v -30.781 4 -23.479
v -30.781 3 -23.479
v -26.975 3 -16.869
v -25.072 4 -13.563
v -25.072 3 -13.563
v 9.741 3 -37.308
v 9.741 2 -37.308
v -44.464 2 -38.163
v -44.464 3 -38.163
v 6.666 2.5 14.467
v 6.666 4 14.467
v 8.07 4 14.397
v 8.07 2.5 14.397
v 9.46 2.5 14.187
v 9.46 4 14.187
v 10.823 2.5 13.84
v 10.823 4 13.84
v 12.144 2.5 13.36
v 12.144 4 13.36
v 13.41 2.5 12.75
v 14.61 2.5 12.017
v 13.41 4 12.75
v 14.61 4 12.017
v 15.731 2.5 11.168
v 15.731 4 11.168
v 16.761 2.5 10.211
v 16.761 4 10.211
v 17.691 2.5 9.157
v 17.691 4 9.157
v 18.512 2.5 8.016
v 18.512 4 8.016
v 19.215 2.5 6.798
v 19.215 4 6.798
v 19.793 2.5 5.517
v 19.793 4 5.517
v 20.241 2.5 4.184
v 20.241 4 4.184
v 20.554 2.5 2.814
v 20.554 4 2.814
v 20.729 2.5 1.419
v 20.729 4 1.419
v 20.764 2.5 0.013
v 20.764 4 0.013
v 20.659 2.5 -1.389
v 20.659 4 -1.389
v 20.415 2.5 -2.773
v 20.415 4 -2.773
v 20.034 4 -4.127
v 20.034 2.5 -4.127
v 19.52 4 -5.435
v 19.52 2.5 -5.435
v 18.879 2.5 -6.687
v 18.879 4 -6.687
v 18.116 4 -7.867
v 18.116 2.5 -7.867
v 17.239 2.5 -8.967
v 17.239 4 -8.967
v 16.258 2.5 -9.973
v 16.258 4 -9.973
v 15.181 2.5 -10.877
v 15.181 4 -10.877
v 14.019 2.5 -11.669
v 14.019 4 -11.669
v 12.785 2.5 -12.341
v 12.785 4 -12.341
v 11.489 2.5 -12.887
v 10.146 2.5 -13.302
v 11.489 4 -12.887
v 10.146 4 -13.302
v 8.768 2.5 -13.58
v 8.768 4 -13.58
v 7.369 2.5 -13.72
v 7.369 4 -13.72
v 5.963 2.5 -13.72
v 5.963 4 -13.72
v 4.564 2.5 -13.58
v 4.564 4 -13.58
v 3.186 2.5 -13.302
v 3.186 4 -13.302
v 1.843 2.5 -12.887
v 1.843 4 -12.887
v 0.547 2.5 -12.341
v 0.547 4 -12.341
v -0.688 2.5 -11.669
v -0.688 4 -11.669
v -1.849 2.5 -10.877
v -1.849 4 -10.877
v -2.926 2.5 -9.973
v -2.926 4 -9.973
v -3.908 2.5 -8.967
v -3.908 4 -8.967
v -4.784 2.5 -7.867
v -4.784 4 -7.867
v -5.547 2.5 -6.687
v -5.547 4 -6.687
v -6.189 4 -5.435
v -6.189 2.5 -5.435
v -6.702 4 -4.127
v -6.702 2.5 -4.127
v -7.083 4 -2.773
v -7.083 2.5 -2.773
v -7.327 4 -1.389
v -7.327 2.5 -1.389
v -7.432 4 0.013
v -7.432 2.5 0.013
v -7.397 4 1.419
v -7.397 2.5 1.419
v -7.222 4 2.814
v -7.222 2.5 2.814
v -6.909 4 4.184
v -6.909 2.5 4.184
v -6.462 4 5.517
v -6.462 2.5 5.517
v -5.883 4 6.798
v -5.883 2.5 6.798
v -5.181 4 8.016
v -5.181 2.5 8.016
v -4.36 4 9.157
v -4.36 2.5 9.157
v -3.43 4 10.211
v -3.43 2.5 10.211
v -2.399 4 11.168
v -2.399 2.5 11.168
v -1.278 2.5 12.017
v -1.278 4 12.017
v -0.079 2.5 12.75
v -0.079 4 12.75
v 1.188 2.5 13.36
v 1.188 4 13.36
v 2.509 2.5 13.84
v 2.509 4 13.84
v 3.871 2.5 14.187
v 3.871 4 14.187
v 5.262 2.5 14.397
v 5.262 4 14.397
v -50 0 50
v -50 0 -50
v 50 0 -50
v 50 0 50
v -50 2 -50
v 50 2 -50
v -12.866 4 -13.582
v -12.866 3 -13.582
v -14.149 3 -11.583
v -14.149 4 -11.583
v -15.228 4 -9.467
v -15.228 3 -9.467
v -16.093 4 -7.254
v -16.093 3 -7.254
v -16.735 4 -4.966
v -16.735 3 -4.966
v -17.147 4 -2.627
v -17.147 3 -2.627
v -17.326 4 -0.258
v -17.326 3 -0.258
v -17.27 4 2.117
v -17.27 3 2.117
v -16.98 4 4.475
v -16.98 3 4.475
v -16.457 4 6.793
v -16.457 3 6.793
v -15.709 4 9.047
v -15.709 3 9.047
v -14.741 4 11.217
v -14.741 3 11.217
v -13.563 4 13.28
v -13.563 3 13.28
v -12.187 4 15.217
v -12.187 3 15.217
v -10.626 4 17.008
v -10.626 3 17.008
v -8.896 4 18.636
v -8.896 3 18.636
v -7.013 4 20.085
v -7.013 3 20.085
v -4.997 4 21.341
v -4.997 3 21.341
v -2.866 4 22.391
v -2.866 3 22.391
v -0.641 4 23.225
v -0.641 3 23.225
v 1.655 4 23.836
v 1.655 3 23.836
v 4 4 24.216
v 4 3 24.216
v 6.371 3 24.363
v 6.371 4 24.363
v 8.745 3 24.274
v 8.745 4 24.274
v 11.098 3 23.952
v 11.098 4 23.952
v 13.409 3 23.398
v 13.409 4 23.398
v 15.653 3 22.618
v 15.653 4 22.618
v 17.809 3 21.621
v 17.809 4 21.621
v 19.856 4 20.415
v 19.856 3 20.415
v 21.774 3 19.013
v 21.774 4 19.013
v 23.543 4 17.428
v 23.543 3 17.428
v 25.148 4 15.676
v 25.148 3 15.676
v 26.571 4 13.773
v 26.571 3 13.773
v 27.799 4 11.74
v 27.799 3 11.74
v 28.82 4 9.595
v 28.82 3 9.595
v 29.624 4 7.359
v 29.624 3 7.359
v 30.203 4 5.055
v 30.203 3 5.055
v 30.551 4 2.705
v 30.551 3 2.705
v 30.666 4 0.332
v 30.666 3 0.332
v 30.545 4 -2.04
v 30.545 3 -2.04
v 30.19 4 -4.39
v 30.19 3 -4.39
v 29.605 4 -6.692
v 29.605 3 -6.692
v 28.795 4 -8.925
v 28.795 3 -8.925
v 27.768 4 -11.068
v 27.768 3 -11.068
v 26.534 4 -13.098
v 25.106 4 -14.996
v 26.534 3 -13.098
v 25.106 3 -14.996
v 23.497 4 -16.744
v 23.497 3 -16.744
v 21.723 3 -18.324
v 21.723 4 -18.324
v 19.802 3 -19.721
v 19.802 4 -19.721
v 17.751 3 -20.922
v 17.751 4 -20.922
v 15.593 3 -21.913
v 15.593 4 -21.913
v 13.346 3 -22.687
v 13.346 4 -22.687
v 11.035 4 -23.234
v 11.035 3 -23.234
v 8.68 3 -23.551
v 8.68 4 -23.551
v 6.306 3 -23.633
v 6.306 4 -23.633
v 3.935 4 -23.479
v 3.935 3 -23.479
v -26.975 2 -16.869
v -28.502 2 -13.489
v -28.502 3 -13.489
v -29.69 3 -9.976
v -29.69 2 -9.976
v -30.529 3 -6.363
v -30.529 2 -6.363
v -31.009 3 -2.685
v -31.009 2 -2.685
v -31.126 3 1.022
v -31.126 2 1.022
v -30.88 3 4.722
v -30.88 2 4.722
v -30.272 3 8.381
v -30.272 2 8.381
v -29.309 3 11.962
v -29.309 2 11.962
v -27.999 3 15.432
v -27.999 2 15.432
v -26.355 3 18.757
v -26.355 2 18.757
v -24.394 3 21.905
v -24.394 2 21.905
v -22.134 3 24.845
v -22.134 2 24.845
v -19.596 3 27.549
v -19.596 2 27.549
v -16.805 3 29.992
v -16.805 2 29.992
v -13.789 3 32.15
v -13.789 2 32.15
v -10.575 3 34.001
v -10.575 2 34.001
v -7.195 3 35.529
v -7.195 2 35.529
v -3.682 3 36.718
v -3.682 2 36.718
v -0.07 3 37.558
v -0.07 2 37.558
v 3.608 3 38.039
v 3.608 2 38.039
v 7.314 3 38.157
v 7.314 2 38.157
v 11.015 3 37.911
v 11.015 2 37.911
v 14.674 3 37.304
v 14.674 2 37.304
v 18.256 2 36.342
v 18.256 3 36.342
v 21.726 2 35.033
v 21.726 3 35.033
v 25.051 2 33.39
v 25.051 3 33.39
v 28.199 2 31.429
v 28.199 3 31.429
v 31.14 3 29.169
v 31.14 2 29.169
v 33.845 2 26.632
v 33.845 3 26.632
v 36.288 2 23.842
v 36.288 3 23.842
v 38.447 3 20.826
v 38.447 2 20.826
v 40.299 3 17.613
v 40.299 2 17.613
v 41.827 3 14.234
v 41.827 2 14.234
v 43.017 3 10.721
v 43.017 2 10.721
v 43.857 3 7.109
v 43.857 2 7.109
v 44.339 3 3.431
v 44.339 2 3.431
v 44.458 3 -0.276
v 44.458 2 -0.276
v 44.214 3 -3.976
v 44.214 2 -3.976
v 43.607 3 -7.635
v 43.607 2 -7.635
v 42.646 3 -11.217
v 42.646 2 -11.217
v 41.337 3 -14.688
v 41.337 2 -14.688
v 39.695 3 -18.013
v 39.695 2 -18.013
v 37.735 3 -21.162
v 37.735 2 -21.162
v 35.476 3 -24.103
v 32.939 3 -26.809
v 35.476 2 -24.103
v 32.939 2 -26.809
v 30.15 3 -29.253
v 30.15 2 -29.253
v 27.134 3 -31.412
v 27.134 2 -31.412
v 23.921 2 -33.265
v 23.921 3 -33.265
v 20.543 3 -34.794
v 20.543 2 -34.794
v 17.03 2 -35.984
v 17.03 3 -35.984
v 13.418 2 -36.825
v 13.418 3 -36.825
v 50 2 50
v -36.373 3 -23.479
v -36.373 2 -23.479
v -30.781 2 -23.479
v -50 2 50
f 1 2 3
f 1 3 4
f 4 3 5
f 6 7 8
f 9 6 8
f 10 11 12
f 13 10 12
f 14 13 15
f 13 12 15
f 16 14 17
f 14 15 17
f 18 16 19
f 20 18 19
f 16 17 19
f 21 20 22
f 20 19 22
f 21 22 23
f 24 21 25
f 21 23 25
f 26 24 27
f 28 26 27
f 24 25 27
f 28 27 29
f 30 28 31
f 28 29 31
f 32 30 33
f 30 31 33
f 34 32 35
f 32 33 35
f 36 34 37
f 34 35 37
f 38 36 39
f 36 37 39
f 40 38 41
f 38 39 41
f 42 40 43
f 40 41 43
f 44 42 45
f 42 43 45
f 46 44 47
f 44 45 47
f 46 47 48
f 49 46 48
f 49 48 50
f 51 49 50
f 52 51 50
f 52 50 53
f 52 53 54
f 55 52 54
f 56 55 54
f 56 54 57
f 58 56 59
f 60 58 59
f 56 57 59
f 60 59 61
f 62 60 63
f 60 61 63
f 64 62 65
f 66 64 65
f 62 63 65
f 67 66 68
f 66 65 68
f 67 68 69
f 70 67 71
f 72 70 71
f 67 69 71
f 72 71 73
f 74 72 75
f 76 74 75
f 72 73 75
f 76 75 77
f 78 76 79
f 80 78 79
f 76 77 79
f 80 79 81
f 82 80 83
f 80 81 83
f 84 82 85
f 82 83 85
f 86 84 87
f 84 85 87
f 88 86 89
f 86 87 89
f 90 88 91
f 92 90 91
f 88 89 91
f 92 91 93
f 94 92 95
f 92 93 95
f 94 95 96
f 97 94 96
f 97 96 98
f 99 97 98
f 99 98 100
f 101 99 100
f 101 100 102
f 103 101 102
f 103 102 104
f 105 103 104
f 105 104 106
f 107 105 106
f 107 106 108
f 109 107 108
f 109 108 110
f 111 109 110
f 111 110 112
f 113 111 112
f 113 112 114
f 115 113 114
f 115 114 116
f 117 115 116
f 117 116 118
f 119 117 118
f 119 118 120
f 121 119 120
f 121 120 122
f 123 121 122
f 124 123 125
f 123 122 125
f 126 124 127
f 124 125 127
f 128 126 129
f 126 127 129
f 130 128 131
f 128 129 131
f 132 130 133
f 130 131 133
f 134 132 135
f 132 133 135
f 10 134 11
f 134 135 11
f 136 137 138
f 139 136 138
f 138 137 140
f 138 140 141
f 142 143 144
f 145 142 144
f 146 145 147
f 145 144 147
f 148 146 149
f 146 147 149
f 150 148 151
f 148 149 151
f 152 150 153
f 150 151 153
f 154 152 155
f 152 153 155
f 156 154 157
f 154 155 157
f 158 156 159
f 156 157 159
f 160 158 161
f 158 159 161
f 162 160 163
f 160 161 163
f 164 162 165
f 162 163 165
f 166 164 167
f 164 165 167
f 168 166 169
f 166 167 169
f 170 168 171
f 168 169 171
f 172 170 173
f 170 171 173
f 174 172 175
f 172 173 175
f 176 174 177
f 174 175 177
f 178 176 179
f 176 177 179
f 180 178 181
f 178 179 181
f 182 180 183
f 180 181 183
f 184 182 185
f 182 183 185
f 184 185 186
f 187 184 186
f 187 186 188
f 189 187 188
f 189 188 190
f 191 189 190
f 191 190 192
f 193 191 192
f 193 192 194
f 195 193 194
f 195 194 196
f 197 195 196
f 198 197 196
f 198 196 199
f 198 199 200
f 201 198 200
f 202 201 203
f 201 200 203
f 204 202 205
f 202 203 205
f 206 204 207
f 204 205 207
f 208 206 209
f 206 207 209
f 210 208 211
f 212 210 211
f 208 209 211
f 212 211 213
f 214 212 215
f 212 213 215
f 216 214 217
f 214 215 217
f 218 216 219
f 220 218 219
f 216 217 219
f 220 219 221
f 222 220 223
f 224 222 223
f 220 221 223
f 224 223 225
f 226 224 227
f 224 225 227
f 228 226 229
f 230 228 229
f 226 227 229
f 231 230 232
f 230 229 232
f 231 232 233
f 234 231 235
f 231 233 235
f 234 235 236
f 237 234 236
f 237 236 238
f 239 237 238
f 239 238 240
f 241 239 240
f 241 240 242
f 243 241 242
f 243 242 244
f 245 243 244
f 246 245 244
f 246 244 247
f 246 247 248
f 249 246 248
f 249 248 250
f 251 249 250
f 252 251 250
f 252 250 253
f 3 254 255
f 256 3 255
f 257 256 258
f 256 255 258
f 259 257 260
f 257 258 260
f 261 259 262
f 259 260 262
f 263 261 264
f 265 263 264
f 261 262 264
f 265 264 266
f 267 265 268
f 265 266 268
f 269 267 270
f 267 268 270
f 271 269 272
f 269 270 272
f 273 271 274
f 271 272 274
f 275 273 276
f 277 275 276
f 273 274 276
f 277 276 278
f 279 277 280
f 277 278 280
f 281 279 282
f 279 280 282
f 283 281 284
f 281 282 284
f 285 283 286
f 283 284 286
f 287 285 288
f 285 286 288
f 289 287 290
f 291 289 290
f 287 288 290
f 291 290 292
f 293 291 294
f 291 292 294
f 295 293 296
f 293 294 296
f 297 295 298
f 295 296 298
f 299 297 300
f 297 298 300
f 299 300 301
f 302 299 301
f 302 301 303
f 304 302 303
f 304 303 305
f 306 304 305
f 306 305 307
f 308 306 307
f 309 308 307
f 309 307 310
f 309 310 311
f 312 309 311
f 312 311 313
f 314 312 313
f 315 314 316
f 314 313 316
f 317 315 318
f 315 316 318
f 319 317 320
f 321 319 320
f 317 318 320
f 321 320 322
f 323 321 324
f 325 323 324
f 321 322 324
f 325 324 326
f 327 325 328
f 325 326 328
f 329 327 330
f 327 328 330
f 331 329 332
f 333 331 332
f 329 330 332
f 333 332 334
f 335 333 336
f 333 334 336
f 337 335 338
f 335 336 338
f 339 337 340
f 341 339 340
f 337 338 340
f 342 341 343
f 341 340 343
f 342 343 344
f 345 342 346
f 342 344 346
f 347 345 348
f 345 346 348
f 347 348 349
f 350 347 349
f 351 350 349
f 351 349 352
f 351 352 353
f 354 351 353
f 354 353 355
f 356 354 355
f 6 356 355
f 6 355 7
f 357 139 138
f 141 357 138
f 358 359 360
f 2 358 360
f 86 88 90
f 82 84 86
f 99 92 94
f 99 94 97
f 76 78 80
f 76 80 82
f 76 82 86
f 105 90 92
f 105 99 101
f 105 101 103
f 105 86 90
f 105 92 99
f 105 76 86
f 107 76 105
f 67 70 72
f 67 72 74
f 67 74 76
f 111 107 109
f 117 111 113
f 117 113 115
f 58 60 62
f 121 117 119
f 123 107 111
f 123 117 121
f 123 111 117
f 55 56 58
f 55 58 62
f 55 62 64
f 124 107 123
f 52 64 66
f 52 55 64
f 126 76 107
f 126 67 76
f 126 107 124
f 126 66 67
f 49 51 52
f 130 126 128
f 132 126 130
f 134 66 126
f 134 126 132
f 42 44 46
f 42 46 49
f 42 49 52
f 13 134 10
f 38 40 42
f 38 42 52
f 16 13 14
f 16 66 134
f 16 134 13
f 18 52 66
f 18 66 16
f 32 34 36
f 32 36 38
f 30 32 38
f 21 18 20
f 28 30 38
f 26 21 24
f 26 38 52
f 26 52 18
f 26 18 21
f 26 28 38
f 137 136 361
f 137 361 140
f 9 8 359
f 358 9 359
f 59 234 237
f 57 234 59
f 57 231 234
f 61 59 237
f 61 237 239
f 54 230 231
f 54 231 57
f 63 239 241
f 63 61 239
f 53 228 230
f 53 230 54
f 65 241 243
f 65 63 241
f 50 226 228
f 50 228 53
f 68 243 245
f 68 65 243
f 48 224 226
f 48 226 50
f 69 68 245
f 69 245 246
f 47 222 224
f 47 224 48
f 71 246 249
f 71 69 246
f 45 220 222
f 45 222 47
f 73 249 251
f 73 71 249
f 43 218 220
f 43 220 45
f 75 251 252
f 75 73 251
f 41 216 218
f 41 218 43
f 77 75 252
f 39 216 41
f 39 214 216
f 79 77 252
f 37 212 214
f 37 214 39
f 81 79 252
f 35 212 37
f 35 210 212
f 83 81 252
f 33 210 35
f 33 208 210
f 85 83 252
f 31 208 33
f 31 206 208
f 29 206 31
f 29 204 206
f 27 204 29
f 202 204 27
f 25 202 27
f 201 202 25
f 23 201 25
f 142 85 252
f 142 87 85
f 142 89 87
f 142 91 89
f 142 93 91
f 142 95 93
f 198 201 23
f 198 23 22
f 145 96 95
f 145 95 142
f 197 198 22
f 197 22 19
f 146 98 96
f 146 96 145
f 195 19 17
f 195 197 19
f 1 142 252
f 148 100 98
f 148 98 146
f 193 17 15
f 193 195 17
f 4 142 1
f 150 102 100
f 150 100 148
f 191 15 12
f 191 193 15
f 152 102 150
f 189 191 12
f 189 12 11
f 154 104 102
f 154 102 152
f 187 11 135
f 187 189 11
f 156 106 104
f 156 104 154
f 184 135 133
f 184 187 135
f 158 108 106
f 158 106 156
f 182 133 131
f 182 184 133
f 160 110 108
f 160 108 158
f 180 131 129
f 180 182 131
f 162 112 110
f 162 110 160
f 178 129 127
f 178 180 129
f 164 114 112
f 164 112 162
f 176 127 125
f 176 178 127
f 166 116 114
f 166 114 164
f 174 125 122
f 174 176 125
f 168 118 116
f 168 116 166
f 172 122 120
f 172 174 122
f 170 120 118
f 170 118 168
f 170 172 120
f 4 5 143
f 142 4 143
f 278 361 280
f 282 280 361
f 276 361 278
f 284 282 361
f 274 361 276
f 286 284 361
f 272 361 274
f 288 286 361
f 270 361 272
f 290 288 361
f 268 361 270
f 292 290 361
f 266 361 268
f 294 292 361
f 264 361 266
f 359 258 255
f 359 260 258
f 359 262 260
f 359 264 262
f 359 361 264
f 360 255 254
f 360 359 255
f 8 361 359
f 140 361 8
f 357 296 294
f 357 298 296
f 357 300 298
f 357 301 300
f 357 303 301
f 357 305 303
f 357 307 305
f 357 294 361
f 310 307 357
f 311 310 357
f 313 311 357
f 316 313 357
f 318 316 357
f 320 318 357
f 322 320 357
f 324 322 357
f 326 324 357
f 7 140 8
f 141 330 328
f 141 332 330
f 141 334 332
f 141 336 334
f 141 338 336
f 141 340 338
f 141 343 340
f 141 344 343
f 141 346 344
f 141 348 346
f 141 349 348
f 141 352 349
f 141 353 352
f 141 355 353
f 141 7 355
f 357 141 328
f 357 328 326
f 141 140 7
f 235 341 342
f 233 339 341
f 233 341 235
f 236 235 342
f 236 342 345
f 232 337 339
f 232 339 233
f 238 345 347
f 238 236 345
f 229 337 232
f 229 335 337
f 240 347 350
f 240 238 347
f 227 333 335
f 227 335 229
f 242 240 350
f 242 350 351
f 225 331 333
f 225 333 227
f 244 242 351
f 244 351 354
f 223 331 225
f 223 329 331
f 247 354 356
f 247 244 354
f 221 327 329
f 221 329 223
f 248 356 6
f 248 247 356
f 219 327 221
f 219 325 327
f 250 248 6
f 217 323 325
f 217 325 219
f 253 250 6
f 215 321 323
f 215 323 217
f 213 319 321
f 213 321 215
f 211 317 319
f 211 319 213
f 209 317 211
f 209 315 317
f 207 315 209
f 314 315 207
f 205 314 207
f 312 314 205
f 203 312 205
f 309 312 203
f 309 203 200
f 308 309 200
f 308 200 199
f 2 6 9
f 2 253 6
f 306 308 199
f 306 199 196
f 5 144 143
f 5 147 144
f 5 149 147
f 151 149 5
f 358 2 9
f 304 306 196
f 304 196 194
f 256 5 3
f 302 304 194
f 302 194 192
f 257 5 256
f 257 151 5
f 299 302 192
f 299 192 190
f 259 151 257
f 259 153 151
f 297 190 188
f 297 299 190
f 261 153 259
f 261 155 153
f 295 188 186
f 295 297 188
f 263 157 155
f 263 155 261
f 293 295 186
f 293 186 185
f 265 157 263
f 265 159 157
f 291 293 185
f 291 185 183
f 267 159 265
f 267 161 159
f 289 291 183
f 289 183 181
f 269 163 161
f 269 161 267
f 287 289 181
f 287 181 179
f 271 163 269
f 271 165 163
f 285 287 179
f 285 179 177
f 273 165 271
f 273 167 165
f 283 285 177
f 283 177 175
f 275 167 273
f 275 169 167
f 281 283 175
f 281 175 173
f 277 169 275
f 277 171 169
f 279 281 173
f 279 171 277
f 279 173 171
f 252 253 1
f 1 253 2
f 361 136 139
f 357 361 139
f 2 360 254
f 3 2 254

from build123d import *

# Parameters (mm, degrees)
SKETCH1_W           = 100
SKETCH1_H           = 100
BOSS_EXTRUDE1_DEPTH = 2
BOSS_EXTRUDE2_DEPTH = 1
BOSS_EXTRUDE5_DEPTH = 1
SKETCH10_R          = 14.102334265
CUT_EXTRUDE1_DEPTH  = 1.5


with BuildPart() as part:
    # Sketch1 → Boss-Extrude1 (new body)
    with BuildSketch(Plane(origin=(0, 0, 0), x_dir=(1, 0, 0), z_dir=(0, 1, 0))):
        Rectangle(SKETCH1_W, SKETCH1_H)
    extrude(amount=BOSS_EXTRUDE1_DEPTH)

    # Inner Lines Incorrect → Boss-Extrude2 (add)
    with BuildSketch(Plane(origin=(0, 2, 0), x_dir=(-1, 0, 0), z_dir=(0, 1, 0))):
        with BuildLine():
            Line((-9.740714552, -37.307950056), (44.463704926, -38.16254763))
            Line((44.463704926, -38.16254763), (36.373030269, -23.4794714))
            Line((36.373030269, -23.4794714), (30.780994203, -23.4794714))
            Line((30.780994203, -23.4794714), (26.974802478, -16.868717352))
            ThreePointArc((26.974802478, -16.868717352), (-25.050764907, 33.390013397), (-9.740714552, -37.307950056))
        make_face()
    extrude(amount=BOSS_EXTRUDE2_DEPTH)

    # Perfect Trace FT Logo → Boss-Extrude5 (add)
    with BuildSketch(Plane(origin=(0, 3, 0), x_dir=(-1, 0, 0), z_dir=(0, 1, 0))):
        with BuildLine():
            Line((30.780994203, -23.4794714), (25.071735693, -13.56339083))
            Line((25.071735693, -13.56339083), (12.86572713, -13.582342535))
            ThreePointArc((12.86572713, -13.582342535), (-18.847428313, 21.043350665), (-3.934978039, -23.4794714))
            Line((-3.934978039, -23.4794714), (30.780994203, -23.4794714))
        make_face()
    extrude(amount=BOSS_EXTRUDE5_DEPTH)

    # Sketch10 → Cut-Extrude1 (cut)
    with BuildSketch(Plane(origin=(0, 4, 0), x_dir=(1, 0, 0), z_dir=(0, 1, 0))):
        with Locations(Location((6.665815692, -0.364658396, 0), (0, 0, 270))):
            Circle(SKETCH10_R)
    extrude(amount=-CUT_EXTRUDE1_DEPTH, mode=Mode.SUBTRACT)


solid = part.part
